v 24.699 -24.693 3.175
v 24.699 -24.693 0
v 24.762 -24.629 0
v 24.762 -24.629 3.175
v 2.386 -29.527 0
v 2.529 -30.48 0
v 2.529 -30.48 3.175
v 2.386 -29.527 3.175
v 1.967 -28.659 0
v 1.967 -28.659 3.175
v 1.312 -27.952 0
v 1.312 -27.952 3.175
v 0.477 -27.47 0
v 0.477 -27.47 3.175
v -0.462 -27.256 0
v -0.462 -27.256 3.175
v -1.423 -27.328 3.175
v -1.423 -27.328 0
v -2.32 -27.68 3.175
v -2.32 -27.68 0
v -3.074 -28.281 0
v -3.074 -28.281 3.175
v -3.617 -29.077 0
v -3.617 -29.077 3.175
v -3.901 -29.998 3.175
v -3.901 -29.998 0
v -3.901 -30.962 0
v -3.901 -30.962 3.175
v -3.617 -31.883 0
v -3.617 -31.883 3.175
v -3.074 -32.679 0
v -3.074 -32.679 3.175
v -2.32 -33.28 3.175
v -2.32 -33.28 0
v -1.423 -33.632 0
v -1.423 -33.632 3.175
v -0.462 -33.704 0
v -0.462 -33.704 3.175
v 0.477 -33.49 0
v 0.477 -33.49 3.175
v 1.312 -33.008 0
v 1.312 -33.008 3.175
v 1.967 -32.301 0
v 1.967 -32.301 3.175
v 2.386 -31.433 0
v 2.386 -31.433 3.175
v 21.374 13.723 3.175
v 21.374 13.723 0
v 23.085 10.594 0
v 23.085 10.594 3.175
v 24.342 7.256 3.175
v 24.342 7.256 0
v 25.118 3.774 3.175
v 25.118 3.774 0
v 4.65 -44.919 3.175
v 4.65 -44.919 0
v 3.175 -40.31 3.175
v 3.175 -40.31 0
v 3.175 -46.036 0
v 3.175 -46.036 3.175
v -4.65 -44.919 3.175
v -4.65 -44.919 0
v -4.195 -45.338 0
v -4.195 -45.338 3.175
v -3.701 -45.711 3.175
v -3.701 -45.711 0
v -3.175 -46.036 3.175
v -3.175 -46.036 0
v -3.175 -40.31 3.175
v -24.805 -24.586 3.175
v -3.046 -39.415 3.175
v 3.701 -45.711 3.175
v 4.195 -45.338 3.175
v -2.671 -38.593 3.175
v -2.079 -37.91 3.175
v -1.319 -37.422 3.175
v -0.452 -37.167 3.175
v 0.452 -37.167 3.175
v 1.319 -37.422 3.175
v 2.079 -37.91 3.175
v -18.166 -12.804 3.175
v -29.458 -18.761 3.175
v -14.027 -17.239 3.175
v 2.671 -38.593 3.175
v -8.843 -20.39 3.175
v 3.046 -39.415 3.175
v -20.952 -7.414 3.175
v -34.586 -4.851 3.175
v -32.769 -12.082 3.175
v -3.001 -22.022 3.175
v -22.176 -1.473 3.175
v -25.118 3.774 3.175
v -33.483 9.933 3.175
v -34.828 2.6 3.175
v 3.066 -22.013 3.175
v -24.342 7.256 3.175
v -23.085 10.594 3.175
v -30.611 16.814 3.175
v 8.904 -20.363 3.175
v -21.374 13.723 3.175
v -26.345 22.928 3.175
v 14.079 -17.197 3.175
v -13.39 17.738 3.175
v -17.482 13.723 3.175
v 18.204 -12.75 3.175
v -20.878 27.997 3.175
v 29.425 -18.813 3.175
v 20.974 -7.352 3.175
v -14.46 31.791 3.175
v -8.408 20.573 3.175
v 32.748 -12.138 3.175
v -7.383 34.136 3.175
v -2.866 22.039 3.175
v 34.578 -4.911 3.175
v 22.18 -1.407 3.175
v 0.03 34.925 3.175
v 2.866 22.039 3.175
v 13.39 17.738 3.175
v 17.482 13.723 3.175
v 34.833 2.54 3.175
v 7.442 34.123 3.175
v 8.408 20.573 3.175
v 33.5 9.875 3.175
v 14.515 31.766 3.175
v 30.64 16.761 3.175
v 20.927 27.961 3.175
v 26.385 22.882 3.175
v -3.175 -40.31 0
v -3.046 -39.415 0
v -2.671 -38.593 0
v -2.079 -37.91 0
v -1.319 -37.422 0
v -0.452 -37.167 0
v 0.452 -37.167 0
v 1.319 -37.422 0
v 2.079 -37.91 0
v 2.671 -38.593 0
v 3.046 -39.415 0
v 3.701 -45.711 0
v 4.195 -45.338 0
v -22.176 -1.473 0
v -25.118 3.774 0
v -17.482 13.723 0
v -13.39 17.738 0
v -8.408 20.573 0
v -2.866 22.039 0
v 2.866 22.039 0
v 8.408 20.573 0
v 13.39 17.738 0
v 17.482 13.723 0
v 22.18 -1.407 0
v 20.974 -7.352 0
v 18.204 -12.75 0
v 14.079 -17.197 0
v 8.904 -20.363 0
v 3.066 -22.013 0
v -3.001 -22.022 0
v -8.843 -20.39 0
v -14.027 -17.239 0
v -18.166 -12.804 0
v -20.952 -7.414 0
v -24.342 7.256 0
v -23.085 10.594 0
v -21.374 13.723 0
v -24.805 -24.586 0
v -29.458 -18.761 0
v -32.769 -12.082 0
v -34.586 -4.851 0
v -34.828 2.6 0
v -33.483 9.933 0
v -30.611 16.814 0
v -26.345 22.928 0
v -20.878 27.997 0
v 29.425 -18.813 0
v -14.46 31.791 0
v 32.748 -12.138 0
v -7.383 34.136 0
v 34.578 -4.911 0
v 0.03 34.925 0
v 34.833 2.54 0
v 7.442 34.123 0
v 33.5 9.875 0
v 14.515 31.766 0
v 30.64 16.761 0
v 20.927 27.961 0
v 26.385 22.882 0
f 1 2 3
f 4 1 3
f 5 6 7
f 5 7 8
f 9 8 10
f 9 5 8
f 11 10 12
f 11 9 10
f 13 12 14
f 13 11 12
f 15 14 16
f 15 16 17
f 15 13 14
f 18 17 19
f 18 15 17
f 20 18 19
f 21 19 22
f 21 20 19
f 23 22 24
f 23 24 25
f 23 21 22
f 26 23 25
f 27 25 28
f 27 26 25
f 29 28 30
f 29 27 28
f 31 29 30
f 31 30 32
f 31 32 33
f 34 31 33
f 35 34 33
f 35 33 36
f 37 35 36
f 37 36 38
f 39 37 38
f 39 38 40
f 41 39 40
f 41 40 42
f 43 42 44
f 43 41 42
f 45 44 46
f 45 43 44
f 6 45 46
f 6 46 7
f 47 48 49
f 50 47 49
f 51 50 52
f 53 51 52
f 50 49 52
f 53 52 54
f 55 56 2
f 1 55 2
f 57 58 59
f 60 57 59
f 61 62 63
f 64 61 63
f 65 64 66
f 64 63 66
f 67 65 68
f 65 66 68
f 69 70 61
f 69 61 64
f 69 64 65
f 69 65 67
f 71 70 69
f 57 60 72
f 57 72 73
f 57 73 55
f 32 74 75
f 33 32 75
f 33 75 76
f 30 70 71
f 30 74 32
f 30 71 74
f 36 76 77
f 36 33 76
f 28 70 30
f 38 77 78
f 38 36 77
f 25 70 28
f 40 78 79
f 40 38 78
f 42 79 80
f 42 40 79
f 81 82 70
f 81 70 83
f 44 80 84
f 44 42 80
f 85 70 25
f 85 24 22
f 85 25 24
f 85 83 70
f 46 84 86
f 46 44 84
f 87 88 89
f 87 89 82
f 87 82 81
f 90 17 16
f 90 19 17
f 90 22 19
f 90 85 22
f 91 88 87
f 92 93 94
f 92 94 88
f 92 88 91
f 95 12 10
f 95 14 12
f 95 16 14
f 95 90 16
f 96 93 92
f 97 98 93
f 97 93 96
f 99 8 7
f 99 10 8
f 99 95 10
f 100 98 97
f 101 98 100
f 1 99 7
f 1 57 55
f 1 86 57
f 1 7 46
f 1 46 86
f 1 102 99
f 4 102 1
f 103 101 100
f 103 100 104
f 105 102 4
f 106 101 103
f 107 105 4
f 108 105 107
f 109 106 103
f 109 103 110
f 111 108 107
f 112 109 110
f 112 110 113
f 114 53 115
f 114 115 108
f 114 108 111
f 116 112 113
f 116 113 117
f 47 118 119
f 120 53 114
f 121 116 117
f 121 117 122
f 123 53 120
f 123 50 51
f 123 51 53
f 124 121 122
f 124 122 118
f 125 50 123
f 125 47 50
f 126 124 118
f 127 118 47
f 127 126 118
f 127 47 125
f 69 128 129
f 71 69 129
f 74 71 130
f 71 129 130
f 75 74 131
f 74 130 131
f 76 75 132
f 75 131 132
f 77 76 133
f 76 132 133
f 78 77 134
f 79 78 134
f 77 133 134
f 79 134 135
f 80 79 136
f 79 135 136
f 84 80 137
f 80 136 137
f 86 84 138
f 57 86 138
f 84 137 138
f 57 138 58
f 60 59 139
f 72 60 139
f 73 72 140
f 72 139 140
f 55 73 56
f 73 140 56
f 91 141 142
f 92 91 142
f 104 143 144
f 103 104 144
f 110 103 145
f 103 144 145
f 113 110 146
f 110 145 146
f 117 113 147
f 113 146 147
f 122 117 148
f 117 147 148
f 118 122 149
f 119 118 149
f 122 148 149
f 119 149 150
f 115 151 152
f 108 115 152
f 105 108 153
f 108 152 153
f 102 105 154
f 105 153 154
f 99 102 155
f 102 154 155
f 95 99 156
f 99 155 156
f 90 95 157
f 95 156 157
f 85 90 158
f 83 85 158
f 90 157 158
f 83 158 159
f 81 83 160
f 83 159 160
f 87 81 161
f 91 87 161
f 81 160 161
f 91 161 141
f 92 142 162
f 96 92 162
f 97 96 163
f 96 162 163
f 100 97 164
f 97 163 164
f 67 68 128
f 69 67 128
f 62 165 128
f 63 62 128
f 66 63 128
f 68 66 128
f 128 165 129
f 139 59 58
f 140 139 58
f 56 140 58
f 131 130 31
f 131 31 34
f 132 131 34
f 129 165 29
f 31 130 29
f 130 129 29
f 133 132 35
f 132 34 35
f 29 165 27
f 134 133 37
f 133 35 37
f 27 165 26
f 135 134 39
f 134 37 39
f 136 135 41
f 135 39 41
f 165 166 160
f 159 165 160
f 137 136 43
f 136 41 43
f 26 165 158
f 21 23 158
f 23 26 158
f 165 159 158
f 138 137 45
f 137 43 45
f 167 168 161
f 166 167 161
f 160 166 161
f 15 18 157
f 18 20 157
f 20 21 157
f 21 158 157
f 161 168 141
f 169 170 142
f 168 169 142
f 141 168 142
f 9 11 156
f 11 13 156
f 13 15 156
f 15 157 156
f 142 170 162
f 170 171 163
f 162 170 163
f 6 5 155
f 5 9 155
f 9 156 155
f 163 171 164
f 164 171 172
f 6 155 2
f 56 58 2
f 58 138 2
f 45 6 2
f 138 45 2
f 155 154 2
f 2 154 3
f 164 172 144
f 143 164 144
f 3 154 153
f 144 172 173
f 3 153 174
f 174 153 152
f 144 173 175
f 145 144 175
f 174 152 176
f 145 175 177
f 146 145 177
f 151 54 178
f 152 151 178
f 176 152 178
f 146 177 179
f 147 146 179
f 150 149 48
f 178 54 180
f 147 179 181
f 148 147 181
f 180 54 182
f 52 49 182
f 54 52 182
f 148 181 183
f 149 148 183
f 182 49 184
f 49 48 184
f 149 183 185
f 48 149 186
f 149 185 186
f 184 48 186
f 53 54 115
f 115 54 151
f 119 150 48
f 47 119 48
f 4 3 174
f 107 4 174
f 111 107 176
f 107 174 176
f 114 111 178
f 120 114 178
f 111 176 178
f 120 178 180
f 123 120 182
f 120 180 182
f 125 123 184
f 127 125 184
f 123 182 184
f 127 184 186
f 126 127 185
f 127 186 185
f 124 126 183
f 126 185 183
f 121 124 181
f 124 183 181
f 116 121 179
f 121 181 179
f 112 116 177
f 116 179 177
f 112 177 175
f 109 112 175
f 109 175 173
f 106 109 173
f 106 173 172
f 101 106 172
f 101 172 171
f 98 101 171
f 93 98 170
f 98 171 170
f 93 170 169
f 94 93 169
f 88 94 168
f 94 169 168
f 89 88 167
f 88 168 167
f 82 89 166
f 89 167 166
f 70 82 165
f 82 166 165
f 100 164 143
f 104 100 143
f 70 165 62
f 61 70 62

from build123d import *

# Parameters (mm, degrees)
F0_R     = 3.233186
F1_DEPTH = 3.175


with BuildPart() as f1:
    # F0 (on Top) → F1 (new body)
    with BuildSketch(Plane.XY):
        with BuildLine():
            Line((24.698584, -24.693283), (24.761808, -24.629424))
            ThreePointArc((24.761808, -24.629424), (0.030307, 34.924987), (-24.804516, -24.586411))
            Line((-24.804516, -24.586411), (-4.650402, -44.919312))
            ThreePointArc((-4.650402, -44.919312), (-3.952362, -45.530209), (-3.175, -46.036336))
            Line((-3.175, -46.036336), (-3.175, -40.3098))
            ThreePointArc((-3.175, -40.3098), (0, -37.1348), (3.175, -40.3098))
            Line((3.175, -40.3098), (3.175, -46.036336))
            ThreePointArc((3.175, -46.036336), (3.952362, -45.530209), (4.650402, -44.919312))
            Line((4.650402, -44.919312), (24.698584, -24.693283))
        make_face()
        with Locations((-0.703903, -30.48)):
            Circle(F0_R, mode=Mode.SUBTRACT)
        with BuildLine():
            ThreePointArc((22.180412, -1.4071), (0.032937, -22.224976), (-22.176144, -1.472834))
            Line((-22.176144, -1.472834), (-25.118009, 3.774338))
            ThreePointArc((-25.118009, 3.774338), (-23.772102, 8.946907), (-21.373594, 13.723318))
            Line((-21.373594, 13.723318), (-17.482024, 13.723318))
            ThreePointArc((-17.482024, 13.723318), (0, 22.225), (17.482024, 13.723318))
            Line((17.482024, 13.723318), (21.373594, 13.723318))
            ThreePointArc((21.373594, 13.723318), (23.772102, 8.946907), (25.118009, 3.774338))
            Line((25.118009, 3.774338), (22.180412, -1.4071))
        make_face(mode=Mode.SUBTRACT)
    extrude(amount=F1_DEPTH)


solid = f1.part
